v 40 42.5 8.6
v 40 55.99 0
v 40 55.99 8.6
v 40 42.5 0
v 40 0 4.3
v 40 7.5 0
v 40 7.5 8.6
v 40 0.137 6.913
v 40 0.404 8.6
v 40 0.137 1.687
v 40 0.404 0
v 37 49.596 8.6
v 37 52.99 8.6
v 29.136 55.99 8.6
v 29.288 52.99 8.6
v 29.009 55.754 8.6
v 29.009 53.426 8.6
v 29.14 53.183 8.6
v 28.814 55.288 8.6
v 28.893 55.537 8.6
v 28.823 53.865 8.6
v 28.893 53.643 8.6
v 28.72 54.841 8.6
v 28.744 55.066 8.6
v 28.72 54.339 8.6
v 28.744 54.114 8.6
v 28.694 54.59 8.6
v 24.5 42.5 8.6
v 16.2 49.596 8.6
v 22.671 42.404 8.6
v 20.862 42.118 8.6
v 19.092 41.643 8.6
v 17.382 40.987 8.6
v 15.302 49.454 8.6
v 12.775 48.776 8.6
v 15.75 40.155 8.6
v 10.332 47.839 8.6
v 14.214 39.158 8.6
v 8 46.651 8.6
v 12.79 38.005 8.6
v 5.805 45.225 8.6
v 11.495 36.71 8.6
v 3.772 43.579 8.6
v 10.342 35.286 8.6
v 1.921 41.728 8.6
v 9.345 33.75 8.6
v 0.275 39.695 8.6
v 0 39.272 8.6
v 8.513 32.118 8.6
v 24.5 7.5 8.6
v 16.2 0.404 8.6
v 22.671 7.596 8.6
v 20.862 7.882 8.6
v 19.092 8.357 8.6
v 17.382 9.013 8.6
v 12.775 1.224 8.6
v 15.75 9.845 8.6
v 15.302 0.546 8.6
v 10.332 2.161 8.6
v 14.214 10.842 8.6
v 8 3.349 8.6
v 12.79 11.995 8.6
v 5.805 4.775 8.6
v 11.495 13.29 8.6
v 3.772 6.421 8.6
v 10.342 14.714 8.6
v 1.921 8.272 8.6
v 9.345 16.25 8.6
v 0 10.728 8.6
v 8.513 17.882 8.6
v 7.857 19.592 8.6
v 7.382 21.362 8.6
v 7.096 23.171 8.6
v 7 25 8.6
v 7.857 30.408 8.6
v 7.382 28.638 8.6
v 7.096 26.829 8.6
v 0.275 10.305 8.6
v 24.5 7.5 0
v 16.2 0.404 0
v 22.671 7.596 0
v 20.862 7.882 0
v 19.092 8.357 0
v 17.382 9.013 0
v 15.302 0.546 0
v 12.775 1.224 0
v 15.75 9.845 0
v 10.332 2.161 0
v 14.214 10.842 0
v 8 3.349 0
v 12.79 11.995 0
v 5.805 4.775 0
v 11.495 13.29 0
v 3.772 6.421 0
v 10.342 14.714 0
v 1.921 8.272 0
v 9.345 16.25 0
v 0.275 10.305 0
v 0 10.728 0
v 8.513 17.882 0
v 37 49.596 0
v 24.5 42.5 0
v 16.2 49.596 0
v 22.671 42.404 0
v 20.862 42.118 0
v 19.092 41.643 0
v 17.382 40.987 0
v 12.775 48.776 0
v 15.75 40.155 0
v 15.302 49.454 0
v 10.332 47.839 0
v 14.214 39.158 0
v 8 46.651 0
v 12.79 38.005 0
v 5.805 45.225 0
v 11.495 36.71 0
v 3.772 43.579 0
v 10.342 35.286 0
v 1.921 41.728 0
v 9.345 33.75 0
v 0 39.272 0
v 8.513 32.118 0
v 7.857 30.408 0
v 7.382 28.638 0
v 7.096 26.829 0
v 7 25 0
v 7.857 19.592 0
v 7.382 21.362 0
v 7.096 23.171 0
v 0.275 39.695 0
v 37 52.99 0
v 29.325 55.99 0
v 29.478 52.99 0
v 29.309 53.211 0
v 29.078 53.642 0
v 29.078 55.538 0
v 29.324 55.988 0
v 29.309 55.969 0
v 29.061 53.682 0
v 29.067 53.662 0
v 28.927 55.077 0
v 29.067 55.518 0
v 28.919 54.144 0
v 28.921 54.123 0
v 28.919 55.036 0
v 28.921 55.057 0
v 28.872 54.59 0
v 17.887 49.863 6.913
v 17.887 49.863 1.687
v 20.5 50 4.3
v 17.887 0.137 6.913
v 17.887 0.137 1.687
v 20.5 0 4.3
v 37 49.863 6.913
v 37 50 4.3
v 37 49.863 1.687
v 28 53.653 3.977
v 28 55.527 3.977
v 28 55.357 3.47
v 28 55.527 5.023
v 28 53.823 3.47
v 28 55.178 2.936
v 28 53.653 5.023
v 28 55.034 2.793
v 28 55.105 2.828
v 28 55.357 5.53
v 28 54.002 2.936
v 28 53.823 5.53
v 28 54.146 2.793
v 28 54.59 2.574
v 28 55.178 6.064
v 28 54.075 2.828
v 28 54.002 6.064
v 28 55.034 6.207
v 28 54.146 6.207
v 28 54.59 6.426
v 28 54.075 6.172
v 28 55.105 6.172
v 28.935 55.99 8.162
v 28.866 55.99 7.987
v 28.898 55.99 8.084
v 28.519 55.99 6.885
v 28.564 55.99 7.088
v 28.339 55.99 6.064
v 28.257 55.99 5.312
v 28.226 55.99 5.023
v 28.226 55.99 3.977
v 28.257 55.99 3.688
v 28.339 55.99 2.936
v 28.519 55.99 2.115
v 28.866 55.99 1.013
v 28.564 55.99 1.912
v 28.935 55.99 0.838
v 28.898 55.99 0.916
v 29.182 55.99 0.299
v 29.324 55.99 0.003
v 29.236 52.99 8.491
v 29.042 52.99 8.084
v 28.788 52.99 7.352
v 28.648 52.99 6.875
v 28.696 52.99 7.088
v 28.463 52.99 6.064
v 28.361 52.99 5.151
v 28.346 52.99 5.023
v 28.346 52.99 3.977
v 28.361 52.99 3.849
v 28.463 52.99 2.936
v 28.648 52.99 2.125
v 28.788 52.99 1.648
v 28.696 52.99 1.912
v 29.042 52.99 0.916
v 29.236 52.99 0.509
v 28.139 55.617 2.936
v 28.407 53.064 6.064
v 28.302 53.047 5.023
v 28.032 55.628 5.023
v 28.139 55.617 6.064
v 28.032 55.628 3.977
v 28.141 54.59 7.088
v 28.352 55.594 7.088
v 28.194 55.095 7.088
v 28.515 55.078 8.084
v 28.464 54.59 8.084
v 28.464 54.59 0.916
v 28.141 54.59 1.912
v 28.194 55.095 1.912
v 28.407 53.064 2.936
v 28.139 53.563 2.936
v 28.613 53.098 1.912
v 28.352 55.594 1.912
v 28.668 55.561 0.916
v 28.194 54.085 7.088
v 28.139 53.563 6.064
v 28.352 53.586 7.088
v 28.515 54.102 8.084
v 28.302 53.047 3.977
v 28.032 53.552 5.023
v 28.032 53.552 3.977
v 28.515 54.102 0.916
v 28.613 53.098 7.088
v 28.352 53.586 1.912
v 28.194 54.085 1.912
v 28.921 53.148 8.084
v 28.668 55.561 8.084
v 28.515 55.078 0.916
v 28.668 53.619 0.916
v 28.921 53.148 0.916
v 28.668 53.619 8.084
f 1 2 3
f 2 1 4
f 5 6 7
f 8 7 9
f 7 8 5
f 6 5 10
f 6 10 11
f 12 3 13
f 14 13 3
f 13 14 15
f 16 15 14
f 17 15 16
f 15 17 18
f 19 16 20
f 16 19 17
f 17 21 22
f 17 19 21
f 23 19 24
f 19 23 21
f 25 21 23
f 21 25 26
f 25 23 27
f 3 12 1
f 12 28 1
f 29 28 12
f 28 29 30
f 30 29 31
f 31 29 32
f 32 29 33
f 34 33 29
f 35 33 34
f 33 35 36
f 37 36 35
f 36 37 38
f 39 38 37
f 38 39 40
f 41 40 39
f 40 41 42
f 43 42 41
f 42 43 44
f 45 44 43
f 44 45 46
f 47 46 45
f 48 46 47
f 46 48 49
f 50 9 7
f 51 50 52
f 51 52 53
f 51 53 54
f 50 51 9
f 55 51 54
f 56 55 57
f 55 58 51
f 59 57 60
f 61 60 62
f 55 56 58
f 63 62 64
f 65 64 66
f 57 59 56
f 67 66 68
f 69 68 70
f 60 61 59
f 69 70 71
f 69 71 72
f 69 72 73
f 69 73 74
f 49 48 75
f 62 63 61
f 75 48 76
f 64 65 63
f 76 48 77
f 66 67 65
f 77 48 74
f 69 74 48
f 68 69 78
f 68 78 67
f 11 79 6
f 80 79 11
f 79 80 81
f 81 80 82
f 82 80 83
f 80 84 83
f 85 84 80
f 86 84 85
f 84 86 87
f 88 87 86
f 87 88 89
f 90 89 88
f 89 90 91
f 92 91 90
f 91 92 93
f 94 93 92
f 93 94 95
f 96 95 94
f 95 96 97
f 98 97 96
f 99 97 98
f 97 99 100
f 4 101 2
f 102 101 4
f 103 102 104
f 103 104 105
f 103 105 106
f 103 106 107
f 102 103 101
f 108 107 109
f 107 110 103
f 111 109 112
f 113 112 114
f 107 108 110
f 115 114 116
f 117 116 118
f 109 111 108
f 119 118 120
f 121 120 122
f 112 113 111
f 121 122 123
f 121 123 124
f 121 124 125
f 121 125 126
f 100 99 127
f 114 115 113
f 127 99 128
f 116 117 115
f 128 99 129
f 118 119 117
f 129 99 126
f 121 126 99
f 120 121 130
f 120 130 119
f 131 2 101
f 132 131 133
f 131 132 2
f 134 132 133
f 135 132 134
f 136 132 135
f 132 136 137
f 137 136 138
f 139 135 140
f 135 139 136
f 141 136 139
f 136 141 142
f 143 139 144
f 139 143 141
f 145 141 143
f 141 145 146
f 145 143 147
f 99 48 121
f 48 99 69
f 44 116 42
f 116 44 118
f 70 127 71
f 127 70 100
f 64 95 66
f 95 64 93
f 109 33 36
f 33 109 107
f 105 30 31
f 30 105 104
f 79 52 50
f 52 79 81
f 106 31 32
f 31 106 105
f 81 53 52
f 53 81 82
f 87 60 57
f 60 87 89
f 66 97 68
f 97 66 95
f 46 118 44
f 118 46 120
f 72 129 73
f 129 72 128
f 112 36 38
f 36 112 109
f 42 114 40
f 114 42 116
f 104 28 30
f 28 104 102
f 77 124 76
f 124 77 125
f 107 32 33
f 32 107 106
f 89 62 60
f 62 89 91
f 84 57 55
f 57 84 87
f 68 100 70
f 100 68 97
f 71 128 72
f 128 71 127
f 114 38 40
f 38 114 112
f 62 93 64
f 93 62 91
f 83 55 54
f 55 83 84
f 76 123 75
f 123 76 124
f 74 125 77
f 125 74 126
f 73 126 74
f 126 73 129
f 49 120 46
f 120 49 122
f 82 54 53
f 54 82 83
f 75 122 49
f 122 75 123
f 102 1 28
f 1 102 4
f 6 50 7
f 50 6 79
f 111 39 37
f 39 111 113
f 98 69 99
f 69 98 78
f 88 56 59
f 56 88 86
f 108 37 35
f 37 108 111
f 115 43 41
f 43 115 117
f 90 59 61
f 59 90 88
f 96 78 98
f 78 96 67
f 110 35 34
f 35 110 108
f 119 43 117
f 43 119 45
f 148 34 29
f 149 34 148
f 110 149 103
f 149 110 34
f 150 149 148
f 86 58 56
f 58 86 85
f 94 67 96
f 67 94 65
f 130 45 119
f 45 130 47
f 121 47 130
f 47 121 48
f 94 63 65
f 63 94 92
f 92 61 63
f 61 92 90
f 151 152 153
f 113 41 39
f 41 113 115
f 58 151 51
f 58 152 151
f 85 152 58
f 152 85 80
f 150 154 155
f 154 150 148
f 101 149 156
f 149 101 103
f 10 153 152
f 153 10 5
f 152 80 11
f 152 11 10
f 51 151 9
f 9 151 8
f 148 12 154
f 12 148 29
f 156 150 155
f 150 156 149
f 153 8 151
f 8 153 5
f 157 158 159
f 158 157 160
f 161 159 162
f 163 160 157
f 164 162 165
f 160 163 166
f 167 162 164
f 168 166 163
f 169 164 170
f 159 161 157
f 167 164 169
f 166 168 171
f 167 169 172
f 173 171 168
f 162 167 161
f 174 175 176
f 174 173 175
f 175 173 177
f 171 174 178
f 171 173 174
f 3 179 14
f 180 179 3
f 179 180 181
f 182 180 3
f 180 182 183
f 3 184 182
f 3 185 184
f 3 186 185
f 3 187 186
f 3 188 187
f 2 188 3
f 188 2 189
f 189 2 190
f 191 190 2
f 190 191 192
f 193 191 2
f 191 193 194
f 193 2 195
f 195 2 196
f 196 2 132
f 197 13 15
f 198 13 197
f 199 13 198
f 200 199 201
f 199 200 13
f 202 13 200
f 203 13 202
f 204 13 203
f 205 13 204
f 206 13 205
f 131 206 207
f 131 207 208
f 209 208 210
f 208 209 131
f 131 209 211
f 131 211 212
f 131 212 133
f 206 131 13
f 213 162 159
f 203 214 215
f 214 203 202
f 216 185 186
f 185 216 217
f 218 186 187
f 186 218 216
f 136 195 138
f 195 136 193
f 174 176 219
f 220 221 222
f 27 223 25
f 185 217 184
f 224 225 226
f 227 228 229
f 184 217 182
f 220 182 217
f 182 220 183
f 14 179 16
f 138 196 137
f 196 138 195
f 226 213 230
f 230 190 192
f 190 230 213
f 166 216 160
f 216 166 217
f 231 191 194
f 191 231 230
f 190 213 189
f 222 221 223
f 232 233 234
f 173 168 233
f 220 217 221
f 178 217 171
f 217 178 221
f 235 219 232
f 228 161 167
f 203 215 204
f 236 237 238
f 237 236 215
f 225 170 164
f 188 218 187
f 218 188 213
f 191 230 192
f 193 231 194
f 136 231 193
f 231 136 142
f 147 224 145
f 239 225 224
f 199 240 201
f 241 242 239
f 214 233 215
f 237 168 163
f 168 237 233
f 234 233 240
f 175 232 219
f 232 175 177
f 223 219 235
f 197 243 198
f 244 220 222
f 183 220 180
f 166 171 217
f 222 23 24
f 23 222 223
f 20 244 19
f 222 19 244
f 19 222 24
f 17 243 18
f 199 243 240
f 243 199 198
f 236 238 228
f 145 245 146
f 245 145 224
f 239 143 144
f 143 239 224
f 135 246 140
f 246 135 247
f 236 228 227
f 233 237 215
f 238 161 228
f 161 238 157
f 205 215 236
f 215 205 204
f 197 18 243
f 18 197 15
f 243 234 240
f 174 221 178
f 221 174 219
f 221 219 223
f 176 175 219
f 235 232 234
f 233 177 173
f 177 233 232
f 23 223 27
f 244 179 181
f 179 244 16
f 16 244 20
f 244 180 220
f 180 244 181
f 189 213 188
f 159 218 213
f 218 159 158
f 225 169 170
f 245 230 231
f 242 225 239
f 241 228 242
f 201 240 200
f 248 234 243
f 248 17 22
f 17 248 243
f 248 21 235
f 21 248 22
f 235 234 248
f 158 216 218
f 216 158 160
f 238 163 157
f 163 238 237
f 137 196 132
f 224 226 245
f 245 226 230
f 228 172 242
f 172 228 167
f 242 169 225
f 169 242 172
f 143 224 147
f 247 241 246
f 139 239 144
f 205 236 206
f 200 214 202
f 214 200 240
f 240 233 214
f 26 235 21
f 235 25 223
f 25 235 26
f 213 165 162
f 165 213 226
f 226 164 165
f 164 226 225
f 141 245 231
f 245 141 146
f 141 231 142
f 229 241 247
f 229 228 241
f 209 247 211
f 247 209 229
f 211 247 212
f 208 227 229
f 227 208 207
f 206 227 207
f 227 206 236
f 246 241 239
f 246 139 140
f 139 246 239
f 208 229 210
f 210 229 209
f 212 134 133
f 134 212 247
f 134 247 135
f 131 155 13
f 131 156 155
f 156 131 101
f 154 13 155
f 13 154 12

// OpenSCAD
$fn=60;

DELTA=0.01;

W=50;
H=40;
D=35;

PADX=7;

THICK=8.6;

module horn()
{
     intersection() {
     difference()
     {
	  cube([H,W,THICK]);
	  translate([D/2+PADX,W/2,-DELTA])cylinder(d=D,h=100);
	  translate([D/2+PADX,(W-D)/2,-DELTA])cube([100,D,100]);
     }
     translate([D/2+PADX-4,W/2,-DELTA]) union()
	  {
	       translate([0,-W/2,0])cube([W,W,100]);
	       cylinder(d=W,h=100);
	  }
     }
}

CT=3;
CW=3;
HL=12;

module handle()
{
     intersection() {
     horn();
     translate([0,25,THICK/2])rotate([0,90,0])cylinder(d=50,h=200);
     }
     translate([H-CT,W-2,0])cube([CT,CW+3,THICK]);
     translate([H-HL,W+CW-DELTA,0])intersection(){
	  cube([HL,CW,THICK]);
	  translate([9.8,1.6,4.5])scale([1,0.5,1])sphere(d=20);
     }
}

handle();
